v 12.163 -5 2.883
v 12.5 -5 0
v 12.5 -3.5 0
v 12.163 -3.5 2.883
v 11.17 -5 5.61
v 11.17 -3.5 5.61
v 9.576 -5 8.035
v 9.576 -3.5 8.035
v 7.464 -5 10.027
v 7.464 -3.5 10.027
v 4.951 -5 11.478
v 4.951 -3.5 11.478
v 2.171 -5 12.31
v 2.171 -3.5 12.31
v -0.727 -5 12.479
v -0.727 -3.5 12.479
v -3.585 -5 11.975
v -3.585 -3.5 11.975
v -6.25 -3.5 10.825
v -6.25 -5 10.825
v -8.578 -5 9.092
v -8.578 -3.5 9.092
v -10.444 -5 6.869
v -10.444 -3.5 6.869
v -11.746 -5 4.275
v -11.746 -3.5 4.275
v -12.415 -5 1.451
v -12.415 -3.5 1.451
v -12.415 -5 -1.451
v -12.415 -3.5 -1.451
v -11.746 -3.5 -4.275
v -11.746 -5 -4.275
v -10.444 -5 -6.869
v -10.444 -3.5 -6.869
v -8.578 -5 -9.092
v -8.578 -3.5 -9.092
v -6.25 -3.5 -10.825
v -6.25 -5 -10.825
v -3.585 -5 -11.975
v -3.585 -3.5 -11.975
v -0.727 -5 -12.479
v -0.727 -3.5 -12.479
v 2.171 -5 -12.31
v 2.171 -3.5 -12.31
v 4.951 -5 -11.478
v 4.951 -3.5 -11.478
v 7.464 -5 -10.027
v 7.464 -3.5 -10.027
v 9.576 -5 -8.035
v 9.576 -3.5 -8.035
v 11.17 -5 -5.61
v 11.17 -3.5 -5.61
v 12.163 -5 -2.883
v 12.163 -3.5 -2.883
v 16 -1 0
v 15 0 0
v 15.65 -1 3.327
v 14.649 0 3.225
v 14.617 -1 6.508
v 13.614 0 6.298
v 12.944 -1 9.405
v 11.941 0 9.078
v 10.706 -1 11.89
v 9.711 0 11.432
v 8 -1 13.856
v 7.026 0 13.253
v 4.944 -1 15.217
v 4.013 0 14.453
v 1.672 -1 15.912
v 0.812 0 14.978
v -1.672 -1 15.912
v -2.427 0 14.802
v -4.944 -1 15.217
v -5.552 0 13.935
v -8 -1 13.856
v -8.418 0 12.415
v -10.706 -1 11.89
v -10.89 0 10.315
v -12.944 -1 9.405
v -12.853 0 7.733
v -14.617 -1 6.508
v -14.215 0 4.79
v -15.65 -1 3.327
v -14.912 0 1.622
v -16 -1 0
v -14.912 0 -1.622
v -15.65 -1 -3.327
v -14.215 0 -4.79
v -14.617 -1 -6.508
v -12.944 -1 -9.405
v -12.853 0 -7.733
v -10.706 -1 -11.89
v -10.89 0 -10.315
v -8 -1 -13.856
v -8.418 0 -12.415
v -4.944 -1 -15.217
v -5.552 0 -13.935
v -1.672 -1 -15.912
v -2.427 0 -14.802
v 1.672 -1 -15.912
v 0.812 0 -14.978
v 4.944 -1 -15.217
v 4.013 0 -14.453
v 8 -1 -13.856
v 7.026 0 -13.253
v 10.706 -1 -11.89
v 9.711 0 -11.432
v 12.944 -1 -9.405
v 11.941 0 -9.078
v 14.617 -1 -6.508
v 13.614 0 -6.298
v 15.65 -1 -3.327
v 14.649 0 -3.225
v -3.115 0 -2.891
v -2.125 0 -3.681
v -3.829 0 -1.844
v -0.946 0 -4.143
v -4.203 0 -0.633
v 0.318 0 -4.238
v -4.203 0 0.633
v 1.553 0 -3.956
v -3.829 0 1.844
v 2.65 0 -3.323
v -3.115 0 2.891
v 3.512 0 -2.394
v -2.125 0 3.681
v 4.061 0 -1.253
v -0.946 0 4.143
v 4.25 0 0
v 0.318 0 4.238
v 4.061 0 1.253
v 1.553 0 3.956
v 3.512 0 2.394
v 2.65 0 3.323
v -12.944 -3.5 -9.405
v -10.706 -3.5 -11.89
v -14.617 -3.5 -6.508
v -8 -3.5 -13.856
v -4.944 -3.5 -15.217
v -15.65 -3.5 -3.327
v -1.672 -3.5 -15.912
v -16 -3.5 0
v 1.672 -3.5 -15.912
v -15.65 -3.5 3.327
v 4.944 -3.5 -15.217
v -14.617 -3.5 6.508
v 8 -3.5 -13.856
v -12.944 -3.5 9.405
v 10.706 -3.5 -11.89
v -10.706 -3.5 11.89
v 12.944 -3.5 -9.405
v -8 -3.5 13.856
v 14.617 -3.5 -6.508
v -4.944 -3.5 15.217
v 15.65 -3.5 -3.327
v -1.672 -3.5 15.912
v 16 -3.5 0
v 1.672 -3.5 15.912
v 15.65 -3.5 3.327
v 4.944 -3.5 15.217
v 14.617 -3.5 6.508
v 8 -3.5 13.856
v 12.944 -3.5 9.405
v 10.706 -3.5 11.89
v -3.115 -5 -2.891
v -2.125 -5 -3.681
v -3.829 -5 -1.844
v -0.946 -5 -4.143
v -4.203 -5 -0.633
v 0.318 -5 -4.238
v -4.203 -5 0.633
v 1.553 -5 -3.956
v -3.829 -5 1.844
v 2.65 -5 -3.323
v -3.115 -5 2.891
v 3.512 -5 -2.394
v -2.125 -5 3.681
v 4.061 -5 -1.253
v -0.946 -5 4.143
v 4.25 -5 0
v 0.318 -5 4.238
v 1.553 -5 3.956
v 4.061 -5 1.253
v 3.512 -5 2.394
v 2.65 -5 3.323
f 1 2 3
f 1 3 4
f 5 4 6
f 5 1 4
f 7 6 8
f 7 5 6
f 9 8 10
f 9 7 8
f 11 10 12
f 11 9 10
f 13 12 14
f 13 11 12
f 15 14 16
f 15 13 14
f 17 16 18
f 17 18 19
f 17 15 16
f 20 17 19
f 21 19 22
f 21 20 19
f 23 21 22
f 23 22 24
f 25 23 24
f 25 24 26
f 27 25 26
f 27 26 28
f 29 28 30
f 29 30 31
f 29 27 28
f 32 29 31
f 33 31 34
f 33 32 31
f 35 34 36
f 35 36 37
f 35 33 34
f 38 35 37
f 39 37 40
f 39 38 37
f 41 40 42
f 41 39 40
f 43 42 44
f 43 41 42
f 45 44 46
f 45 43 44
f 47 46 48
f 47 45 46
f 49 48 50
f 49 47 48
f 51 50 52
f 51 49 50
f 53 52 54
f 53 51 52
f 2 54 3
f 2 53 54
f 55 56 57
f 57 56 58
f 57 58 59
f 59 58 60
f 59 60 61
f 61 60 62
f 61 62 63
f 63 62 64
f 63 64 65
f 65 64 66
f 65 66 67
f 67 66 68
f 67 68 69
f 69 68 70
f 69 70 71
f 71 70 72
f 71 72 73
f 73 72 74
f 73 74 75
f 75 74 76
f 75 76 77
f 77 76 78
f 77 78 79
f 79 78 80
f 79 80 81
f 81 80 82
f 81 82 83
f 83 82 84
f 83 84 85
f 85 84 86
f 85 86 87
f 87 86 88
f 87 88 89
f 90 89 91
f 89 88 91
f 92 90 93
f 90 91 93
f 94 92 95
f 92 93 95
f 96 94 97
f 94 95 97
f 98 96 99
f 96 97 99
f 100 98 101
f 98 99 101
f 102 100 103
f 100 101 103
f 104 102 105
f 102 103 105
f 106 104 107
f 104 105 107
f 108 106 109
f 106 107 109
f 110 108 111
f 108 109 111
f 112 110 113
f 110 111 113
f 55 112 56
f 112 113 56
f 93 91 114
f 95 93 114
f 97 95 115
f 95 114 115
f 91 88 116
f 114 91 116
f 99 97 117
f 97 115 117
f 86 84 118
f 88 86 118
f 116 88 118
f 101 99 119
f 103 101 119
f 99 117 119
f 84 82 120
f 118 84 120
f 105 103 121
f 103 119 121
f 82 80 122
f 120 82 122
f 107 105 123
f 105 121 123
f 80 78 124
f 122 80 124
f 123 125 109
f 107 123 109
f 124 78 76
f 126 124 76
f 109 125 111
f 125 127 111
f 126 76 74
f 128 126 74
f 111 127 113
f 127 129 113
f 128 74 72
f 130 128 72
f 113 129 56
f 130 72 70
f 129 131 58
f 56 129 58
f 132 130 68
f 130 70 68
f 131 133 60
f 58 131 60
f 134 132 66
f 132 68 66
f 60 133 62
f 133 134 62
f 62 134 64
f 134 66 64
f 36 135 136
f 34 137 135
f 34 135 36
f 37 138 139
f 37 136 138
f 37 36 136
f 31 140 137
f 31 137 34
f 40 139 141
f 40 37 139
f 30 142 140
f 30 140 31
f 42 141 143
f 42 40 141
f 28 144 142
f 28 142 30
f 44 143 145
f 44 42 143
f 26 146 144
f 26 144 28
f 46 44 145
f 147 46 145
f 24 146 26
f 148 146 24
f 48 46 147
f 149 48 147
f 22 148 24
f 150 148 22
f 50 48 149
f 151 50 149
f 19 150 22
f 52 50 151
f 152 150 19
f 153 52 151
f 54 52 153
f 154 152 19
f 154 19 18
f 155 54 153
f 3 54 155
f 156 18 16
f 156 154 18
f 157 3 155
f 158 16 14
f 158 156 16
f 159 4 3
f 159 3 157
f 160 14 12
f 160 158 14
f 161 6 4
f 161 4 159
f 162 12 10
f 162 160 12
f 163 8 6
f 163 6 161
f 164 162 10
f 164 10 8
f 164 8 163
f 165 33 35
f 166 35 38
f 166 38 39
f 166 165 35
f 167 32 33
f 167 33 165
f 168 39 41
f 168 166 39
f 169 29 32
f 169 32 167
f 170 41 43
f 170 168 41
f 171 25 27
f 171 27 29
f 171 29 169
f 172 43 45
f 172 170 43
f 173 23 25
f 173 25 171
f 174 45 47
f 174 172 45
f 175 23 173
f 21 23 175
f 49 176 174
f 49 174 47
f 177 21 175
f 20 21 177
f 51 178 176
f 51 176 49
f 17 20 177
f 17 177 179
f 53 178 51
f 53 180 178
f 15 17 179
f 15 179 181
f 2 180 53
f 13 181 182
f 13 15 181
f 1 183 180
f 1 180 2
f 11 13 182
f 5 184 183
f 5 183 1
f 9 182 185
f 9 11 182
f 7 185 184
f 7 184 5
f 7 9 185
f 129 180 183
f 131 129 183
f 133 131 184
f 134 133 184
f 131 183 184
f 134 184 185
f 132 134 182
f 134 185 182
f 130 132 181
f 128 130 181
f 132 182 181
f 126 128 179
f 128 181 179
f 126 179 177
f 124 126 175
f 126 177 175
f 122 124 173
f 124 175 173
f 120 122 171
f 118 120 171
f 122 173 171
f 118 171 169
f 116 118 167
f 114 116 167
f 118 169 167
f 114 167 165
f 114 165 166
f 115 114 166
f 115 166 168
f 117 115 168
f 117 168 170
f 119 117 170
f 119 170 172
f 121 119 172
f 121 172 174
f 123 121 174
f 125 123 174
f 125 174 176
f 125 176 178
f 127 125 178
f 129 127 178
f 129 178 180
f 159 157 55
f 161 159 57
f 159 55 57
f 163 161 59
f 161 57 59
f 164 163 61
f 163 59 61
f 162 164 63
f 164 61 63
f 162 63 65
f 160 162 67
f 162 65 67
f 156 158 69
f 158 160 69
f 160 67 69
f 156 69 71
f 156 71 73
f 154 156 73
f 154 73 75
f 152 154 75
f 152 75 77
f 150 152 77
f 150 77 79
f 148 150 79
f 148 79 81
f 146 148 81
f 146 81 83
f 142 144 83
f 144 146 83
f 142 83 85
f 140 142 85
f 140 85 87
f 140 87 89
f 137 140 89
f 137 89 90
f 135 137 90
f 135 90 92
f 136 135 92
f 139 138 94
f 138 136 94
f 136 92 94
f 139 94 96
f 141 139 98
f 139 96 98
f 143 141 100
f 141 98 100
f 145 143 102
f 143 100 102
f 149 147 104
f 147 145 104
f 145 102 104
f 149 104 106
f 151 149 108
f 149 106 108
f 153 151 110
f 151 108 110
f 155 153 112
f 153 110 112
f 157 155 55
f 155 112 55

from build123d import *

# Parameters (mm, degrees)
F0_R     = 16
F1_DEPTH = 5
F2_R     = 23.291419
F2_R_2   = 12.5
F3_DEPTH = 1.5
F4_SIZE  = 1
F5_R     = 4.25
F6_DEPTH = 25


with BuildPart() as f1:
    # F0 (on Front) → F1 (new body)
    with BuildSketch(Plane.XZ):
        Circle(F0_R)
    extrude(amount=F1_DEPTH)

    # F2 (on face) → F3 (cut)
    with BuildSketch(Plane.XZ.offset(5)):
        Circle(F2_R)
        Circle(F2_R_2, mode=Mode.SUBTRACT)
    extrude(amount=-F3_DEPTH, mode=Mode.SUBTRACT)

    # F4
    f4_edges = [f1.edges().sort_by_distance(p)[0] for p in [
        (-16, 0, 0),
    ]]
    chamfer(f4_edges, length=F4_SIZE)

    # F5 (on face) → F6 (cut)
    with BuildSketch(Plane.XZ.offset(5)):
        Circle(F5_R)
    extrude(amount=-F6_DEPTH, mode=Mode.SUBTRACT)


solid = f1.part
